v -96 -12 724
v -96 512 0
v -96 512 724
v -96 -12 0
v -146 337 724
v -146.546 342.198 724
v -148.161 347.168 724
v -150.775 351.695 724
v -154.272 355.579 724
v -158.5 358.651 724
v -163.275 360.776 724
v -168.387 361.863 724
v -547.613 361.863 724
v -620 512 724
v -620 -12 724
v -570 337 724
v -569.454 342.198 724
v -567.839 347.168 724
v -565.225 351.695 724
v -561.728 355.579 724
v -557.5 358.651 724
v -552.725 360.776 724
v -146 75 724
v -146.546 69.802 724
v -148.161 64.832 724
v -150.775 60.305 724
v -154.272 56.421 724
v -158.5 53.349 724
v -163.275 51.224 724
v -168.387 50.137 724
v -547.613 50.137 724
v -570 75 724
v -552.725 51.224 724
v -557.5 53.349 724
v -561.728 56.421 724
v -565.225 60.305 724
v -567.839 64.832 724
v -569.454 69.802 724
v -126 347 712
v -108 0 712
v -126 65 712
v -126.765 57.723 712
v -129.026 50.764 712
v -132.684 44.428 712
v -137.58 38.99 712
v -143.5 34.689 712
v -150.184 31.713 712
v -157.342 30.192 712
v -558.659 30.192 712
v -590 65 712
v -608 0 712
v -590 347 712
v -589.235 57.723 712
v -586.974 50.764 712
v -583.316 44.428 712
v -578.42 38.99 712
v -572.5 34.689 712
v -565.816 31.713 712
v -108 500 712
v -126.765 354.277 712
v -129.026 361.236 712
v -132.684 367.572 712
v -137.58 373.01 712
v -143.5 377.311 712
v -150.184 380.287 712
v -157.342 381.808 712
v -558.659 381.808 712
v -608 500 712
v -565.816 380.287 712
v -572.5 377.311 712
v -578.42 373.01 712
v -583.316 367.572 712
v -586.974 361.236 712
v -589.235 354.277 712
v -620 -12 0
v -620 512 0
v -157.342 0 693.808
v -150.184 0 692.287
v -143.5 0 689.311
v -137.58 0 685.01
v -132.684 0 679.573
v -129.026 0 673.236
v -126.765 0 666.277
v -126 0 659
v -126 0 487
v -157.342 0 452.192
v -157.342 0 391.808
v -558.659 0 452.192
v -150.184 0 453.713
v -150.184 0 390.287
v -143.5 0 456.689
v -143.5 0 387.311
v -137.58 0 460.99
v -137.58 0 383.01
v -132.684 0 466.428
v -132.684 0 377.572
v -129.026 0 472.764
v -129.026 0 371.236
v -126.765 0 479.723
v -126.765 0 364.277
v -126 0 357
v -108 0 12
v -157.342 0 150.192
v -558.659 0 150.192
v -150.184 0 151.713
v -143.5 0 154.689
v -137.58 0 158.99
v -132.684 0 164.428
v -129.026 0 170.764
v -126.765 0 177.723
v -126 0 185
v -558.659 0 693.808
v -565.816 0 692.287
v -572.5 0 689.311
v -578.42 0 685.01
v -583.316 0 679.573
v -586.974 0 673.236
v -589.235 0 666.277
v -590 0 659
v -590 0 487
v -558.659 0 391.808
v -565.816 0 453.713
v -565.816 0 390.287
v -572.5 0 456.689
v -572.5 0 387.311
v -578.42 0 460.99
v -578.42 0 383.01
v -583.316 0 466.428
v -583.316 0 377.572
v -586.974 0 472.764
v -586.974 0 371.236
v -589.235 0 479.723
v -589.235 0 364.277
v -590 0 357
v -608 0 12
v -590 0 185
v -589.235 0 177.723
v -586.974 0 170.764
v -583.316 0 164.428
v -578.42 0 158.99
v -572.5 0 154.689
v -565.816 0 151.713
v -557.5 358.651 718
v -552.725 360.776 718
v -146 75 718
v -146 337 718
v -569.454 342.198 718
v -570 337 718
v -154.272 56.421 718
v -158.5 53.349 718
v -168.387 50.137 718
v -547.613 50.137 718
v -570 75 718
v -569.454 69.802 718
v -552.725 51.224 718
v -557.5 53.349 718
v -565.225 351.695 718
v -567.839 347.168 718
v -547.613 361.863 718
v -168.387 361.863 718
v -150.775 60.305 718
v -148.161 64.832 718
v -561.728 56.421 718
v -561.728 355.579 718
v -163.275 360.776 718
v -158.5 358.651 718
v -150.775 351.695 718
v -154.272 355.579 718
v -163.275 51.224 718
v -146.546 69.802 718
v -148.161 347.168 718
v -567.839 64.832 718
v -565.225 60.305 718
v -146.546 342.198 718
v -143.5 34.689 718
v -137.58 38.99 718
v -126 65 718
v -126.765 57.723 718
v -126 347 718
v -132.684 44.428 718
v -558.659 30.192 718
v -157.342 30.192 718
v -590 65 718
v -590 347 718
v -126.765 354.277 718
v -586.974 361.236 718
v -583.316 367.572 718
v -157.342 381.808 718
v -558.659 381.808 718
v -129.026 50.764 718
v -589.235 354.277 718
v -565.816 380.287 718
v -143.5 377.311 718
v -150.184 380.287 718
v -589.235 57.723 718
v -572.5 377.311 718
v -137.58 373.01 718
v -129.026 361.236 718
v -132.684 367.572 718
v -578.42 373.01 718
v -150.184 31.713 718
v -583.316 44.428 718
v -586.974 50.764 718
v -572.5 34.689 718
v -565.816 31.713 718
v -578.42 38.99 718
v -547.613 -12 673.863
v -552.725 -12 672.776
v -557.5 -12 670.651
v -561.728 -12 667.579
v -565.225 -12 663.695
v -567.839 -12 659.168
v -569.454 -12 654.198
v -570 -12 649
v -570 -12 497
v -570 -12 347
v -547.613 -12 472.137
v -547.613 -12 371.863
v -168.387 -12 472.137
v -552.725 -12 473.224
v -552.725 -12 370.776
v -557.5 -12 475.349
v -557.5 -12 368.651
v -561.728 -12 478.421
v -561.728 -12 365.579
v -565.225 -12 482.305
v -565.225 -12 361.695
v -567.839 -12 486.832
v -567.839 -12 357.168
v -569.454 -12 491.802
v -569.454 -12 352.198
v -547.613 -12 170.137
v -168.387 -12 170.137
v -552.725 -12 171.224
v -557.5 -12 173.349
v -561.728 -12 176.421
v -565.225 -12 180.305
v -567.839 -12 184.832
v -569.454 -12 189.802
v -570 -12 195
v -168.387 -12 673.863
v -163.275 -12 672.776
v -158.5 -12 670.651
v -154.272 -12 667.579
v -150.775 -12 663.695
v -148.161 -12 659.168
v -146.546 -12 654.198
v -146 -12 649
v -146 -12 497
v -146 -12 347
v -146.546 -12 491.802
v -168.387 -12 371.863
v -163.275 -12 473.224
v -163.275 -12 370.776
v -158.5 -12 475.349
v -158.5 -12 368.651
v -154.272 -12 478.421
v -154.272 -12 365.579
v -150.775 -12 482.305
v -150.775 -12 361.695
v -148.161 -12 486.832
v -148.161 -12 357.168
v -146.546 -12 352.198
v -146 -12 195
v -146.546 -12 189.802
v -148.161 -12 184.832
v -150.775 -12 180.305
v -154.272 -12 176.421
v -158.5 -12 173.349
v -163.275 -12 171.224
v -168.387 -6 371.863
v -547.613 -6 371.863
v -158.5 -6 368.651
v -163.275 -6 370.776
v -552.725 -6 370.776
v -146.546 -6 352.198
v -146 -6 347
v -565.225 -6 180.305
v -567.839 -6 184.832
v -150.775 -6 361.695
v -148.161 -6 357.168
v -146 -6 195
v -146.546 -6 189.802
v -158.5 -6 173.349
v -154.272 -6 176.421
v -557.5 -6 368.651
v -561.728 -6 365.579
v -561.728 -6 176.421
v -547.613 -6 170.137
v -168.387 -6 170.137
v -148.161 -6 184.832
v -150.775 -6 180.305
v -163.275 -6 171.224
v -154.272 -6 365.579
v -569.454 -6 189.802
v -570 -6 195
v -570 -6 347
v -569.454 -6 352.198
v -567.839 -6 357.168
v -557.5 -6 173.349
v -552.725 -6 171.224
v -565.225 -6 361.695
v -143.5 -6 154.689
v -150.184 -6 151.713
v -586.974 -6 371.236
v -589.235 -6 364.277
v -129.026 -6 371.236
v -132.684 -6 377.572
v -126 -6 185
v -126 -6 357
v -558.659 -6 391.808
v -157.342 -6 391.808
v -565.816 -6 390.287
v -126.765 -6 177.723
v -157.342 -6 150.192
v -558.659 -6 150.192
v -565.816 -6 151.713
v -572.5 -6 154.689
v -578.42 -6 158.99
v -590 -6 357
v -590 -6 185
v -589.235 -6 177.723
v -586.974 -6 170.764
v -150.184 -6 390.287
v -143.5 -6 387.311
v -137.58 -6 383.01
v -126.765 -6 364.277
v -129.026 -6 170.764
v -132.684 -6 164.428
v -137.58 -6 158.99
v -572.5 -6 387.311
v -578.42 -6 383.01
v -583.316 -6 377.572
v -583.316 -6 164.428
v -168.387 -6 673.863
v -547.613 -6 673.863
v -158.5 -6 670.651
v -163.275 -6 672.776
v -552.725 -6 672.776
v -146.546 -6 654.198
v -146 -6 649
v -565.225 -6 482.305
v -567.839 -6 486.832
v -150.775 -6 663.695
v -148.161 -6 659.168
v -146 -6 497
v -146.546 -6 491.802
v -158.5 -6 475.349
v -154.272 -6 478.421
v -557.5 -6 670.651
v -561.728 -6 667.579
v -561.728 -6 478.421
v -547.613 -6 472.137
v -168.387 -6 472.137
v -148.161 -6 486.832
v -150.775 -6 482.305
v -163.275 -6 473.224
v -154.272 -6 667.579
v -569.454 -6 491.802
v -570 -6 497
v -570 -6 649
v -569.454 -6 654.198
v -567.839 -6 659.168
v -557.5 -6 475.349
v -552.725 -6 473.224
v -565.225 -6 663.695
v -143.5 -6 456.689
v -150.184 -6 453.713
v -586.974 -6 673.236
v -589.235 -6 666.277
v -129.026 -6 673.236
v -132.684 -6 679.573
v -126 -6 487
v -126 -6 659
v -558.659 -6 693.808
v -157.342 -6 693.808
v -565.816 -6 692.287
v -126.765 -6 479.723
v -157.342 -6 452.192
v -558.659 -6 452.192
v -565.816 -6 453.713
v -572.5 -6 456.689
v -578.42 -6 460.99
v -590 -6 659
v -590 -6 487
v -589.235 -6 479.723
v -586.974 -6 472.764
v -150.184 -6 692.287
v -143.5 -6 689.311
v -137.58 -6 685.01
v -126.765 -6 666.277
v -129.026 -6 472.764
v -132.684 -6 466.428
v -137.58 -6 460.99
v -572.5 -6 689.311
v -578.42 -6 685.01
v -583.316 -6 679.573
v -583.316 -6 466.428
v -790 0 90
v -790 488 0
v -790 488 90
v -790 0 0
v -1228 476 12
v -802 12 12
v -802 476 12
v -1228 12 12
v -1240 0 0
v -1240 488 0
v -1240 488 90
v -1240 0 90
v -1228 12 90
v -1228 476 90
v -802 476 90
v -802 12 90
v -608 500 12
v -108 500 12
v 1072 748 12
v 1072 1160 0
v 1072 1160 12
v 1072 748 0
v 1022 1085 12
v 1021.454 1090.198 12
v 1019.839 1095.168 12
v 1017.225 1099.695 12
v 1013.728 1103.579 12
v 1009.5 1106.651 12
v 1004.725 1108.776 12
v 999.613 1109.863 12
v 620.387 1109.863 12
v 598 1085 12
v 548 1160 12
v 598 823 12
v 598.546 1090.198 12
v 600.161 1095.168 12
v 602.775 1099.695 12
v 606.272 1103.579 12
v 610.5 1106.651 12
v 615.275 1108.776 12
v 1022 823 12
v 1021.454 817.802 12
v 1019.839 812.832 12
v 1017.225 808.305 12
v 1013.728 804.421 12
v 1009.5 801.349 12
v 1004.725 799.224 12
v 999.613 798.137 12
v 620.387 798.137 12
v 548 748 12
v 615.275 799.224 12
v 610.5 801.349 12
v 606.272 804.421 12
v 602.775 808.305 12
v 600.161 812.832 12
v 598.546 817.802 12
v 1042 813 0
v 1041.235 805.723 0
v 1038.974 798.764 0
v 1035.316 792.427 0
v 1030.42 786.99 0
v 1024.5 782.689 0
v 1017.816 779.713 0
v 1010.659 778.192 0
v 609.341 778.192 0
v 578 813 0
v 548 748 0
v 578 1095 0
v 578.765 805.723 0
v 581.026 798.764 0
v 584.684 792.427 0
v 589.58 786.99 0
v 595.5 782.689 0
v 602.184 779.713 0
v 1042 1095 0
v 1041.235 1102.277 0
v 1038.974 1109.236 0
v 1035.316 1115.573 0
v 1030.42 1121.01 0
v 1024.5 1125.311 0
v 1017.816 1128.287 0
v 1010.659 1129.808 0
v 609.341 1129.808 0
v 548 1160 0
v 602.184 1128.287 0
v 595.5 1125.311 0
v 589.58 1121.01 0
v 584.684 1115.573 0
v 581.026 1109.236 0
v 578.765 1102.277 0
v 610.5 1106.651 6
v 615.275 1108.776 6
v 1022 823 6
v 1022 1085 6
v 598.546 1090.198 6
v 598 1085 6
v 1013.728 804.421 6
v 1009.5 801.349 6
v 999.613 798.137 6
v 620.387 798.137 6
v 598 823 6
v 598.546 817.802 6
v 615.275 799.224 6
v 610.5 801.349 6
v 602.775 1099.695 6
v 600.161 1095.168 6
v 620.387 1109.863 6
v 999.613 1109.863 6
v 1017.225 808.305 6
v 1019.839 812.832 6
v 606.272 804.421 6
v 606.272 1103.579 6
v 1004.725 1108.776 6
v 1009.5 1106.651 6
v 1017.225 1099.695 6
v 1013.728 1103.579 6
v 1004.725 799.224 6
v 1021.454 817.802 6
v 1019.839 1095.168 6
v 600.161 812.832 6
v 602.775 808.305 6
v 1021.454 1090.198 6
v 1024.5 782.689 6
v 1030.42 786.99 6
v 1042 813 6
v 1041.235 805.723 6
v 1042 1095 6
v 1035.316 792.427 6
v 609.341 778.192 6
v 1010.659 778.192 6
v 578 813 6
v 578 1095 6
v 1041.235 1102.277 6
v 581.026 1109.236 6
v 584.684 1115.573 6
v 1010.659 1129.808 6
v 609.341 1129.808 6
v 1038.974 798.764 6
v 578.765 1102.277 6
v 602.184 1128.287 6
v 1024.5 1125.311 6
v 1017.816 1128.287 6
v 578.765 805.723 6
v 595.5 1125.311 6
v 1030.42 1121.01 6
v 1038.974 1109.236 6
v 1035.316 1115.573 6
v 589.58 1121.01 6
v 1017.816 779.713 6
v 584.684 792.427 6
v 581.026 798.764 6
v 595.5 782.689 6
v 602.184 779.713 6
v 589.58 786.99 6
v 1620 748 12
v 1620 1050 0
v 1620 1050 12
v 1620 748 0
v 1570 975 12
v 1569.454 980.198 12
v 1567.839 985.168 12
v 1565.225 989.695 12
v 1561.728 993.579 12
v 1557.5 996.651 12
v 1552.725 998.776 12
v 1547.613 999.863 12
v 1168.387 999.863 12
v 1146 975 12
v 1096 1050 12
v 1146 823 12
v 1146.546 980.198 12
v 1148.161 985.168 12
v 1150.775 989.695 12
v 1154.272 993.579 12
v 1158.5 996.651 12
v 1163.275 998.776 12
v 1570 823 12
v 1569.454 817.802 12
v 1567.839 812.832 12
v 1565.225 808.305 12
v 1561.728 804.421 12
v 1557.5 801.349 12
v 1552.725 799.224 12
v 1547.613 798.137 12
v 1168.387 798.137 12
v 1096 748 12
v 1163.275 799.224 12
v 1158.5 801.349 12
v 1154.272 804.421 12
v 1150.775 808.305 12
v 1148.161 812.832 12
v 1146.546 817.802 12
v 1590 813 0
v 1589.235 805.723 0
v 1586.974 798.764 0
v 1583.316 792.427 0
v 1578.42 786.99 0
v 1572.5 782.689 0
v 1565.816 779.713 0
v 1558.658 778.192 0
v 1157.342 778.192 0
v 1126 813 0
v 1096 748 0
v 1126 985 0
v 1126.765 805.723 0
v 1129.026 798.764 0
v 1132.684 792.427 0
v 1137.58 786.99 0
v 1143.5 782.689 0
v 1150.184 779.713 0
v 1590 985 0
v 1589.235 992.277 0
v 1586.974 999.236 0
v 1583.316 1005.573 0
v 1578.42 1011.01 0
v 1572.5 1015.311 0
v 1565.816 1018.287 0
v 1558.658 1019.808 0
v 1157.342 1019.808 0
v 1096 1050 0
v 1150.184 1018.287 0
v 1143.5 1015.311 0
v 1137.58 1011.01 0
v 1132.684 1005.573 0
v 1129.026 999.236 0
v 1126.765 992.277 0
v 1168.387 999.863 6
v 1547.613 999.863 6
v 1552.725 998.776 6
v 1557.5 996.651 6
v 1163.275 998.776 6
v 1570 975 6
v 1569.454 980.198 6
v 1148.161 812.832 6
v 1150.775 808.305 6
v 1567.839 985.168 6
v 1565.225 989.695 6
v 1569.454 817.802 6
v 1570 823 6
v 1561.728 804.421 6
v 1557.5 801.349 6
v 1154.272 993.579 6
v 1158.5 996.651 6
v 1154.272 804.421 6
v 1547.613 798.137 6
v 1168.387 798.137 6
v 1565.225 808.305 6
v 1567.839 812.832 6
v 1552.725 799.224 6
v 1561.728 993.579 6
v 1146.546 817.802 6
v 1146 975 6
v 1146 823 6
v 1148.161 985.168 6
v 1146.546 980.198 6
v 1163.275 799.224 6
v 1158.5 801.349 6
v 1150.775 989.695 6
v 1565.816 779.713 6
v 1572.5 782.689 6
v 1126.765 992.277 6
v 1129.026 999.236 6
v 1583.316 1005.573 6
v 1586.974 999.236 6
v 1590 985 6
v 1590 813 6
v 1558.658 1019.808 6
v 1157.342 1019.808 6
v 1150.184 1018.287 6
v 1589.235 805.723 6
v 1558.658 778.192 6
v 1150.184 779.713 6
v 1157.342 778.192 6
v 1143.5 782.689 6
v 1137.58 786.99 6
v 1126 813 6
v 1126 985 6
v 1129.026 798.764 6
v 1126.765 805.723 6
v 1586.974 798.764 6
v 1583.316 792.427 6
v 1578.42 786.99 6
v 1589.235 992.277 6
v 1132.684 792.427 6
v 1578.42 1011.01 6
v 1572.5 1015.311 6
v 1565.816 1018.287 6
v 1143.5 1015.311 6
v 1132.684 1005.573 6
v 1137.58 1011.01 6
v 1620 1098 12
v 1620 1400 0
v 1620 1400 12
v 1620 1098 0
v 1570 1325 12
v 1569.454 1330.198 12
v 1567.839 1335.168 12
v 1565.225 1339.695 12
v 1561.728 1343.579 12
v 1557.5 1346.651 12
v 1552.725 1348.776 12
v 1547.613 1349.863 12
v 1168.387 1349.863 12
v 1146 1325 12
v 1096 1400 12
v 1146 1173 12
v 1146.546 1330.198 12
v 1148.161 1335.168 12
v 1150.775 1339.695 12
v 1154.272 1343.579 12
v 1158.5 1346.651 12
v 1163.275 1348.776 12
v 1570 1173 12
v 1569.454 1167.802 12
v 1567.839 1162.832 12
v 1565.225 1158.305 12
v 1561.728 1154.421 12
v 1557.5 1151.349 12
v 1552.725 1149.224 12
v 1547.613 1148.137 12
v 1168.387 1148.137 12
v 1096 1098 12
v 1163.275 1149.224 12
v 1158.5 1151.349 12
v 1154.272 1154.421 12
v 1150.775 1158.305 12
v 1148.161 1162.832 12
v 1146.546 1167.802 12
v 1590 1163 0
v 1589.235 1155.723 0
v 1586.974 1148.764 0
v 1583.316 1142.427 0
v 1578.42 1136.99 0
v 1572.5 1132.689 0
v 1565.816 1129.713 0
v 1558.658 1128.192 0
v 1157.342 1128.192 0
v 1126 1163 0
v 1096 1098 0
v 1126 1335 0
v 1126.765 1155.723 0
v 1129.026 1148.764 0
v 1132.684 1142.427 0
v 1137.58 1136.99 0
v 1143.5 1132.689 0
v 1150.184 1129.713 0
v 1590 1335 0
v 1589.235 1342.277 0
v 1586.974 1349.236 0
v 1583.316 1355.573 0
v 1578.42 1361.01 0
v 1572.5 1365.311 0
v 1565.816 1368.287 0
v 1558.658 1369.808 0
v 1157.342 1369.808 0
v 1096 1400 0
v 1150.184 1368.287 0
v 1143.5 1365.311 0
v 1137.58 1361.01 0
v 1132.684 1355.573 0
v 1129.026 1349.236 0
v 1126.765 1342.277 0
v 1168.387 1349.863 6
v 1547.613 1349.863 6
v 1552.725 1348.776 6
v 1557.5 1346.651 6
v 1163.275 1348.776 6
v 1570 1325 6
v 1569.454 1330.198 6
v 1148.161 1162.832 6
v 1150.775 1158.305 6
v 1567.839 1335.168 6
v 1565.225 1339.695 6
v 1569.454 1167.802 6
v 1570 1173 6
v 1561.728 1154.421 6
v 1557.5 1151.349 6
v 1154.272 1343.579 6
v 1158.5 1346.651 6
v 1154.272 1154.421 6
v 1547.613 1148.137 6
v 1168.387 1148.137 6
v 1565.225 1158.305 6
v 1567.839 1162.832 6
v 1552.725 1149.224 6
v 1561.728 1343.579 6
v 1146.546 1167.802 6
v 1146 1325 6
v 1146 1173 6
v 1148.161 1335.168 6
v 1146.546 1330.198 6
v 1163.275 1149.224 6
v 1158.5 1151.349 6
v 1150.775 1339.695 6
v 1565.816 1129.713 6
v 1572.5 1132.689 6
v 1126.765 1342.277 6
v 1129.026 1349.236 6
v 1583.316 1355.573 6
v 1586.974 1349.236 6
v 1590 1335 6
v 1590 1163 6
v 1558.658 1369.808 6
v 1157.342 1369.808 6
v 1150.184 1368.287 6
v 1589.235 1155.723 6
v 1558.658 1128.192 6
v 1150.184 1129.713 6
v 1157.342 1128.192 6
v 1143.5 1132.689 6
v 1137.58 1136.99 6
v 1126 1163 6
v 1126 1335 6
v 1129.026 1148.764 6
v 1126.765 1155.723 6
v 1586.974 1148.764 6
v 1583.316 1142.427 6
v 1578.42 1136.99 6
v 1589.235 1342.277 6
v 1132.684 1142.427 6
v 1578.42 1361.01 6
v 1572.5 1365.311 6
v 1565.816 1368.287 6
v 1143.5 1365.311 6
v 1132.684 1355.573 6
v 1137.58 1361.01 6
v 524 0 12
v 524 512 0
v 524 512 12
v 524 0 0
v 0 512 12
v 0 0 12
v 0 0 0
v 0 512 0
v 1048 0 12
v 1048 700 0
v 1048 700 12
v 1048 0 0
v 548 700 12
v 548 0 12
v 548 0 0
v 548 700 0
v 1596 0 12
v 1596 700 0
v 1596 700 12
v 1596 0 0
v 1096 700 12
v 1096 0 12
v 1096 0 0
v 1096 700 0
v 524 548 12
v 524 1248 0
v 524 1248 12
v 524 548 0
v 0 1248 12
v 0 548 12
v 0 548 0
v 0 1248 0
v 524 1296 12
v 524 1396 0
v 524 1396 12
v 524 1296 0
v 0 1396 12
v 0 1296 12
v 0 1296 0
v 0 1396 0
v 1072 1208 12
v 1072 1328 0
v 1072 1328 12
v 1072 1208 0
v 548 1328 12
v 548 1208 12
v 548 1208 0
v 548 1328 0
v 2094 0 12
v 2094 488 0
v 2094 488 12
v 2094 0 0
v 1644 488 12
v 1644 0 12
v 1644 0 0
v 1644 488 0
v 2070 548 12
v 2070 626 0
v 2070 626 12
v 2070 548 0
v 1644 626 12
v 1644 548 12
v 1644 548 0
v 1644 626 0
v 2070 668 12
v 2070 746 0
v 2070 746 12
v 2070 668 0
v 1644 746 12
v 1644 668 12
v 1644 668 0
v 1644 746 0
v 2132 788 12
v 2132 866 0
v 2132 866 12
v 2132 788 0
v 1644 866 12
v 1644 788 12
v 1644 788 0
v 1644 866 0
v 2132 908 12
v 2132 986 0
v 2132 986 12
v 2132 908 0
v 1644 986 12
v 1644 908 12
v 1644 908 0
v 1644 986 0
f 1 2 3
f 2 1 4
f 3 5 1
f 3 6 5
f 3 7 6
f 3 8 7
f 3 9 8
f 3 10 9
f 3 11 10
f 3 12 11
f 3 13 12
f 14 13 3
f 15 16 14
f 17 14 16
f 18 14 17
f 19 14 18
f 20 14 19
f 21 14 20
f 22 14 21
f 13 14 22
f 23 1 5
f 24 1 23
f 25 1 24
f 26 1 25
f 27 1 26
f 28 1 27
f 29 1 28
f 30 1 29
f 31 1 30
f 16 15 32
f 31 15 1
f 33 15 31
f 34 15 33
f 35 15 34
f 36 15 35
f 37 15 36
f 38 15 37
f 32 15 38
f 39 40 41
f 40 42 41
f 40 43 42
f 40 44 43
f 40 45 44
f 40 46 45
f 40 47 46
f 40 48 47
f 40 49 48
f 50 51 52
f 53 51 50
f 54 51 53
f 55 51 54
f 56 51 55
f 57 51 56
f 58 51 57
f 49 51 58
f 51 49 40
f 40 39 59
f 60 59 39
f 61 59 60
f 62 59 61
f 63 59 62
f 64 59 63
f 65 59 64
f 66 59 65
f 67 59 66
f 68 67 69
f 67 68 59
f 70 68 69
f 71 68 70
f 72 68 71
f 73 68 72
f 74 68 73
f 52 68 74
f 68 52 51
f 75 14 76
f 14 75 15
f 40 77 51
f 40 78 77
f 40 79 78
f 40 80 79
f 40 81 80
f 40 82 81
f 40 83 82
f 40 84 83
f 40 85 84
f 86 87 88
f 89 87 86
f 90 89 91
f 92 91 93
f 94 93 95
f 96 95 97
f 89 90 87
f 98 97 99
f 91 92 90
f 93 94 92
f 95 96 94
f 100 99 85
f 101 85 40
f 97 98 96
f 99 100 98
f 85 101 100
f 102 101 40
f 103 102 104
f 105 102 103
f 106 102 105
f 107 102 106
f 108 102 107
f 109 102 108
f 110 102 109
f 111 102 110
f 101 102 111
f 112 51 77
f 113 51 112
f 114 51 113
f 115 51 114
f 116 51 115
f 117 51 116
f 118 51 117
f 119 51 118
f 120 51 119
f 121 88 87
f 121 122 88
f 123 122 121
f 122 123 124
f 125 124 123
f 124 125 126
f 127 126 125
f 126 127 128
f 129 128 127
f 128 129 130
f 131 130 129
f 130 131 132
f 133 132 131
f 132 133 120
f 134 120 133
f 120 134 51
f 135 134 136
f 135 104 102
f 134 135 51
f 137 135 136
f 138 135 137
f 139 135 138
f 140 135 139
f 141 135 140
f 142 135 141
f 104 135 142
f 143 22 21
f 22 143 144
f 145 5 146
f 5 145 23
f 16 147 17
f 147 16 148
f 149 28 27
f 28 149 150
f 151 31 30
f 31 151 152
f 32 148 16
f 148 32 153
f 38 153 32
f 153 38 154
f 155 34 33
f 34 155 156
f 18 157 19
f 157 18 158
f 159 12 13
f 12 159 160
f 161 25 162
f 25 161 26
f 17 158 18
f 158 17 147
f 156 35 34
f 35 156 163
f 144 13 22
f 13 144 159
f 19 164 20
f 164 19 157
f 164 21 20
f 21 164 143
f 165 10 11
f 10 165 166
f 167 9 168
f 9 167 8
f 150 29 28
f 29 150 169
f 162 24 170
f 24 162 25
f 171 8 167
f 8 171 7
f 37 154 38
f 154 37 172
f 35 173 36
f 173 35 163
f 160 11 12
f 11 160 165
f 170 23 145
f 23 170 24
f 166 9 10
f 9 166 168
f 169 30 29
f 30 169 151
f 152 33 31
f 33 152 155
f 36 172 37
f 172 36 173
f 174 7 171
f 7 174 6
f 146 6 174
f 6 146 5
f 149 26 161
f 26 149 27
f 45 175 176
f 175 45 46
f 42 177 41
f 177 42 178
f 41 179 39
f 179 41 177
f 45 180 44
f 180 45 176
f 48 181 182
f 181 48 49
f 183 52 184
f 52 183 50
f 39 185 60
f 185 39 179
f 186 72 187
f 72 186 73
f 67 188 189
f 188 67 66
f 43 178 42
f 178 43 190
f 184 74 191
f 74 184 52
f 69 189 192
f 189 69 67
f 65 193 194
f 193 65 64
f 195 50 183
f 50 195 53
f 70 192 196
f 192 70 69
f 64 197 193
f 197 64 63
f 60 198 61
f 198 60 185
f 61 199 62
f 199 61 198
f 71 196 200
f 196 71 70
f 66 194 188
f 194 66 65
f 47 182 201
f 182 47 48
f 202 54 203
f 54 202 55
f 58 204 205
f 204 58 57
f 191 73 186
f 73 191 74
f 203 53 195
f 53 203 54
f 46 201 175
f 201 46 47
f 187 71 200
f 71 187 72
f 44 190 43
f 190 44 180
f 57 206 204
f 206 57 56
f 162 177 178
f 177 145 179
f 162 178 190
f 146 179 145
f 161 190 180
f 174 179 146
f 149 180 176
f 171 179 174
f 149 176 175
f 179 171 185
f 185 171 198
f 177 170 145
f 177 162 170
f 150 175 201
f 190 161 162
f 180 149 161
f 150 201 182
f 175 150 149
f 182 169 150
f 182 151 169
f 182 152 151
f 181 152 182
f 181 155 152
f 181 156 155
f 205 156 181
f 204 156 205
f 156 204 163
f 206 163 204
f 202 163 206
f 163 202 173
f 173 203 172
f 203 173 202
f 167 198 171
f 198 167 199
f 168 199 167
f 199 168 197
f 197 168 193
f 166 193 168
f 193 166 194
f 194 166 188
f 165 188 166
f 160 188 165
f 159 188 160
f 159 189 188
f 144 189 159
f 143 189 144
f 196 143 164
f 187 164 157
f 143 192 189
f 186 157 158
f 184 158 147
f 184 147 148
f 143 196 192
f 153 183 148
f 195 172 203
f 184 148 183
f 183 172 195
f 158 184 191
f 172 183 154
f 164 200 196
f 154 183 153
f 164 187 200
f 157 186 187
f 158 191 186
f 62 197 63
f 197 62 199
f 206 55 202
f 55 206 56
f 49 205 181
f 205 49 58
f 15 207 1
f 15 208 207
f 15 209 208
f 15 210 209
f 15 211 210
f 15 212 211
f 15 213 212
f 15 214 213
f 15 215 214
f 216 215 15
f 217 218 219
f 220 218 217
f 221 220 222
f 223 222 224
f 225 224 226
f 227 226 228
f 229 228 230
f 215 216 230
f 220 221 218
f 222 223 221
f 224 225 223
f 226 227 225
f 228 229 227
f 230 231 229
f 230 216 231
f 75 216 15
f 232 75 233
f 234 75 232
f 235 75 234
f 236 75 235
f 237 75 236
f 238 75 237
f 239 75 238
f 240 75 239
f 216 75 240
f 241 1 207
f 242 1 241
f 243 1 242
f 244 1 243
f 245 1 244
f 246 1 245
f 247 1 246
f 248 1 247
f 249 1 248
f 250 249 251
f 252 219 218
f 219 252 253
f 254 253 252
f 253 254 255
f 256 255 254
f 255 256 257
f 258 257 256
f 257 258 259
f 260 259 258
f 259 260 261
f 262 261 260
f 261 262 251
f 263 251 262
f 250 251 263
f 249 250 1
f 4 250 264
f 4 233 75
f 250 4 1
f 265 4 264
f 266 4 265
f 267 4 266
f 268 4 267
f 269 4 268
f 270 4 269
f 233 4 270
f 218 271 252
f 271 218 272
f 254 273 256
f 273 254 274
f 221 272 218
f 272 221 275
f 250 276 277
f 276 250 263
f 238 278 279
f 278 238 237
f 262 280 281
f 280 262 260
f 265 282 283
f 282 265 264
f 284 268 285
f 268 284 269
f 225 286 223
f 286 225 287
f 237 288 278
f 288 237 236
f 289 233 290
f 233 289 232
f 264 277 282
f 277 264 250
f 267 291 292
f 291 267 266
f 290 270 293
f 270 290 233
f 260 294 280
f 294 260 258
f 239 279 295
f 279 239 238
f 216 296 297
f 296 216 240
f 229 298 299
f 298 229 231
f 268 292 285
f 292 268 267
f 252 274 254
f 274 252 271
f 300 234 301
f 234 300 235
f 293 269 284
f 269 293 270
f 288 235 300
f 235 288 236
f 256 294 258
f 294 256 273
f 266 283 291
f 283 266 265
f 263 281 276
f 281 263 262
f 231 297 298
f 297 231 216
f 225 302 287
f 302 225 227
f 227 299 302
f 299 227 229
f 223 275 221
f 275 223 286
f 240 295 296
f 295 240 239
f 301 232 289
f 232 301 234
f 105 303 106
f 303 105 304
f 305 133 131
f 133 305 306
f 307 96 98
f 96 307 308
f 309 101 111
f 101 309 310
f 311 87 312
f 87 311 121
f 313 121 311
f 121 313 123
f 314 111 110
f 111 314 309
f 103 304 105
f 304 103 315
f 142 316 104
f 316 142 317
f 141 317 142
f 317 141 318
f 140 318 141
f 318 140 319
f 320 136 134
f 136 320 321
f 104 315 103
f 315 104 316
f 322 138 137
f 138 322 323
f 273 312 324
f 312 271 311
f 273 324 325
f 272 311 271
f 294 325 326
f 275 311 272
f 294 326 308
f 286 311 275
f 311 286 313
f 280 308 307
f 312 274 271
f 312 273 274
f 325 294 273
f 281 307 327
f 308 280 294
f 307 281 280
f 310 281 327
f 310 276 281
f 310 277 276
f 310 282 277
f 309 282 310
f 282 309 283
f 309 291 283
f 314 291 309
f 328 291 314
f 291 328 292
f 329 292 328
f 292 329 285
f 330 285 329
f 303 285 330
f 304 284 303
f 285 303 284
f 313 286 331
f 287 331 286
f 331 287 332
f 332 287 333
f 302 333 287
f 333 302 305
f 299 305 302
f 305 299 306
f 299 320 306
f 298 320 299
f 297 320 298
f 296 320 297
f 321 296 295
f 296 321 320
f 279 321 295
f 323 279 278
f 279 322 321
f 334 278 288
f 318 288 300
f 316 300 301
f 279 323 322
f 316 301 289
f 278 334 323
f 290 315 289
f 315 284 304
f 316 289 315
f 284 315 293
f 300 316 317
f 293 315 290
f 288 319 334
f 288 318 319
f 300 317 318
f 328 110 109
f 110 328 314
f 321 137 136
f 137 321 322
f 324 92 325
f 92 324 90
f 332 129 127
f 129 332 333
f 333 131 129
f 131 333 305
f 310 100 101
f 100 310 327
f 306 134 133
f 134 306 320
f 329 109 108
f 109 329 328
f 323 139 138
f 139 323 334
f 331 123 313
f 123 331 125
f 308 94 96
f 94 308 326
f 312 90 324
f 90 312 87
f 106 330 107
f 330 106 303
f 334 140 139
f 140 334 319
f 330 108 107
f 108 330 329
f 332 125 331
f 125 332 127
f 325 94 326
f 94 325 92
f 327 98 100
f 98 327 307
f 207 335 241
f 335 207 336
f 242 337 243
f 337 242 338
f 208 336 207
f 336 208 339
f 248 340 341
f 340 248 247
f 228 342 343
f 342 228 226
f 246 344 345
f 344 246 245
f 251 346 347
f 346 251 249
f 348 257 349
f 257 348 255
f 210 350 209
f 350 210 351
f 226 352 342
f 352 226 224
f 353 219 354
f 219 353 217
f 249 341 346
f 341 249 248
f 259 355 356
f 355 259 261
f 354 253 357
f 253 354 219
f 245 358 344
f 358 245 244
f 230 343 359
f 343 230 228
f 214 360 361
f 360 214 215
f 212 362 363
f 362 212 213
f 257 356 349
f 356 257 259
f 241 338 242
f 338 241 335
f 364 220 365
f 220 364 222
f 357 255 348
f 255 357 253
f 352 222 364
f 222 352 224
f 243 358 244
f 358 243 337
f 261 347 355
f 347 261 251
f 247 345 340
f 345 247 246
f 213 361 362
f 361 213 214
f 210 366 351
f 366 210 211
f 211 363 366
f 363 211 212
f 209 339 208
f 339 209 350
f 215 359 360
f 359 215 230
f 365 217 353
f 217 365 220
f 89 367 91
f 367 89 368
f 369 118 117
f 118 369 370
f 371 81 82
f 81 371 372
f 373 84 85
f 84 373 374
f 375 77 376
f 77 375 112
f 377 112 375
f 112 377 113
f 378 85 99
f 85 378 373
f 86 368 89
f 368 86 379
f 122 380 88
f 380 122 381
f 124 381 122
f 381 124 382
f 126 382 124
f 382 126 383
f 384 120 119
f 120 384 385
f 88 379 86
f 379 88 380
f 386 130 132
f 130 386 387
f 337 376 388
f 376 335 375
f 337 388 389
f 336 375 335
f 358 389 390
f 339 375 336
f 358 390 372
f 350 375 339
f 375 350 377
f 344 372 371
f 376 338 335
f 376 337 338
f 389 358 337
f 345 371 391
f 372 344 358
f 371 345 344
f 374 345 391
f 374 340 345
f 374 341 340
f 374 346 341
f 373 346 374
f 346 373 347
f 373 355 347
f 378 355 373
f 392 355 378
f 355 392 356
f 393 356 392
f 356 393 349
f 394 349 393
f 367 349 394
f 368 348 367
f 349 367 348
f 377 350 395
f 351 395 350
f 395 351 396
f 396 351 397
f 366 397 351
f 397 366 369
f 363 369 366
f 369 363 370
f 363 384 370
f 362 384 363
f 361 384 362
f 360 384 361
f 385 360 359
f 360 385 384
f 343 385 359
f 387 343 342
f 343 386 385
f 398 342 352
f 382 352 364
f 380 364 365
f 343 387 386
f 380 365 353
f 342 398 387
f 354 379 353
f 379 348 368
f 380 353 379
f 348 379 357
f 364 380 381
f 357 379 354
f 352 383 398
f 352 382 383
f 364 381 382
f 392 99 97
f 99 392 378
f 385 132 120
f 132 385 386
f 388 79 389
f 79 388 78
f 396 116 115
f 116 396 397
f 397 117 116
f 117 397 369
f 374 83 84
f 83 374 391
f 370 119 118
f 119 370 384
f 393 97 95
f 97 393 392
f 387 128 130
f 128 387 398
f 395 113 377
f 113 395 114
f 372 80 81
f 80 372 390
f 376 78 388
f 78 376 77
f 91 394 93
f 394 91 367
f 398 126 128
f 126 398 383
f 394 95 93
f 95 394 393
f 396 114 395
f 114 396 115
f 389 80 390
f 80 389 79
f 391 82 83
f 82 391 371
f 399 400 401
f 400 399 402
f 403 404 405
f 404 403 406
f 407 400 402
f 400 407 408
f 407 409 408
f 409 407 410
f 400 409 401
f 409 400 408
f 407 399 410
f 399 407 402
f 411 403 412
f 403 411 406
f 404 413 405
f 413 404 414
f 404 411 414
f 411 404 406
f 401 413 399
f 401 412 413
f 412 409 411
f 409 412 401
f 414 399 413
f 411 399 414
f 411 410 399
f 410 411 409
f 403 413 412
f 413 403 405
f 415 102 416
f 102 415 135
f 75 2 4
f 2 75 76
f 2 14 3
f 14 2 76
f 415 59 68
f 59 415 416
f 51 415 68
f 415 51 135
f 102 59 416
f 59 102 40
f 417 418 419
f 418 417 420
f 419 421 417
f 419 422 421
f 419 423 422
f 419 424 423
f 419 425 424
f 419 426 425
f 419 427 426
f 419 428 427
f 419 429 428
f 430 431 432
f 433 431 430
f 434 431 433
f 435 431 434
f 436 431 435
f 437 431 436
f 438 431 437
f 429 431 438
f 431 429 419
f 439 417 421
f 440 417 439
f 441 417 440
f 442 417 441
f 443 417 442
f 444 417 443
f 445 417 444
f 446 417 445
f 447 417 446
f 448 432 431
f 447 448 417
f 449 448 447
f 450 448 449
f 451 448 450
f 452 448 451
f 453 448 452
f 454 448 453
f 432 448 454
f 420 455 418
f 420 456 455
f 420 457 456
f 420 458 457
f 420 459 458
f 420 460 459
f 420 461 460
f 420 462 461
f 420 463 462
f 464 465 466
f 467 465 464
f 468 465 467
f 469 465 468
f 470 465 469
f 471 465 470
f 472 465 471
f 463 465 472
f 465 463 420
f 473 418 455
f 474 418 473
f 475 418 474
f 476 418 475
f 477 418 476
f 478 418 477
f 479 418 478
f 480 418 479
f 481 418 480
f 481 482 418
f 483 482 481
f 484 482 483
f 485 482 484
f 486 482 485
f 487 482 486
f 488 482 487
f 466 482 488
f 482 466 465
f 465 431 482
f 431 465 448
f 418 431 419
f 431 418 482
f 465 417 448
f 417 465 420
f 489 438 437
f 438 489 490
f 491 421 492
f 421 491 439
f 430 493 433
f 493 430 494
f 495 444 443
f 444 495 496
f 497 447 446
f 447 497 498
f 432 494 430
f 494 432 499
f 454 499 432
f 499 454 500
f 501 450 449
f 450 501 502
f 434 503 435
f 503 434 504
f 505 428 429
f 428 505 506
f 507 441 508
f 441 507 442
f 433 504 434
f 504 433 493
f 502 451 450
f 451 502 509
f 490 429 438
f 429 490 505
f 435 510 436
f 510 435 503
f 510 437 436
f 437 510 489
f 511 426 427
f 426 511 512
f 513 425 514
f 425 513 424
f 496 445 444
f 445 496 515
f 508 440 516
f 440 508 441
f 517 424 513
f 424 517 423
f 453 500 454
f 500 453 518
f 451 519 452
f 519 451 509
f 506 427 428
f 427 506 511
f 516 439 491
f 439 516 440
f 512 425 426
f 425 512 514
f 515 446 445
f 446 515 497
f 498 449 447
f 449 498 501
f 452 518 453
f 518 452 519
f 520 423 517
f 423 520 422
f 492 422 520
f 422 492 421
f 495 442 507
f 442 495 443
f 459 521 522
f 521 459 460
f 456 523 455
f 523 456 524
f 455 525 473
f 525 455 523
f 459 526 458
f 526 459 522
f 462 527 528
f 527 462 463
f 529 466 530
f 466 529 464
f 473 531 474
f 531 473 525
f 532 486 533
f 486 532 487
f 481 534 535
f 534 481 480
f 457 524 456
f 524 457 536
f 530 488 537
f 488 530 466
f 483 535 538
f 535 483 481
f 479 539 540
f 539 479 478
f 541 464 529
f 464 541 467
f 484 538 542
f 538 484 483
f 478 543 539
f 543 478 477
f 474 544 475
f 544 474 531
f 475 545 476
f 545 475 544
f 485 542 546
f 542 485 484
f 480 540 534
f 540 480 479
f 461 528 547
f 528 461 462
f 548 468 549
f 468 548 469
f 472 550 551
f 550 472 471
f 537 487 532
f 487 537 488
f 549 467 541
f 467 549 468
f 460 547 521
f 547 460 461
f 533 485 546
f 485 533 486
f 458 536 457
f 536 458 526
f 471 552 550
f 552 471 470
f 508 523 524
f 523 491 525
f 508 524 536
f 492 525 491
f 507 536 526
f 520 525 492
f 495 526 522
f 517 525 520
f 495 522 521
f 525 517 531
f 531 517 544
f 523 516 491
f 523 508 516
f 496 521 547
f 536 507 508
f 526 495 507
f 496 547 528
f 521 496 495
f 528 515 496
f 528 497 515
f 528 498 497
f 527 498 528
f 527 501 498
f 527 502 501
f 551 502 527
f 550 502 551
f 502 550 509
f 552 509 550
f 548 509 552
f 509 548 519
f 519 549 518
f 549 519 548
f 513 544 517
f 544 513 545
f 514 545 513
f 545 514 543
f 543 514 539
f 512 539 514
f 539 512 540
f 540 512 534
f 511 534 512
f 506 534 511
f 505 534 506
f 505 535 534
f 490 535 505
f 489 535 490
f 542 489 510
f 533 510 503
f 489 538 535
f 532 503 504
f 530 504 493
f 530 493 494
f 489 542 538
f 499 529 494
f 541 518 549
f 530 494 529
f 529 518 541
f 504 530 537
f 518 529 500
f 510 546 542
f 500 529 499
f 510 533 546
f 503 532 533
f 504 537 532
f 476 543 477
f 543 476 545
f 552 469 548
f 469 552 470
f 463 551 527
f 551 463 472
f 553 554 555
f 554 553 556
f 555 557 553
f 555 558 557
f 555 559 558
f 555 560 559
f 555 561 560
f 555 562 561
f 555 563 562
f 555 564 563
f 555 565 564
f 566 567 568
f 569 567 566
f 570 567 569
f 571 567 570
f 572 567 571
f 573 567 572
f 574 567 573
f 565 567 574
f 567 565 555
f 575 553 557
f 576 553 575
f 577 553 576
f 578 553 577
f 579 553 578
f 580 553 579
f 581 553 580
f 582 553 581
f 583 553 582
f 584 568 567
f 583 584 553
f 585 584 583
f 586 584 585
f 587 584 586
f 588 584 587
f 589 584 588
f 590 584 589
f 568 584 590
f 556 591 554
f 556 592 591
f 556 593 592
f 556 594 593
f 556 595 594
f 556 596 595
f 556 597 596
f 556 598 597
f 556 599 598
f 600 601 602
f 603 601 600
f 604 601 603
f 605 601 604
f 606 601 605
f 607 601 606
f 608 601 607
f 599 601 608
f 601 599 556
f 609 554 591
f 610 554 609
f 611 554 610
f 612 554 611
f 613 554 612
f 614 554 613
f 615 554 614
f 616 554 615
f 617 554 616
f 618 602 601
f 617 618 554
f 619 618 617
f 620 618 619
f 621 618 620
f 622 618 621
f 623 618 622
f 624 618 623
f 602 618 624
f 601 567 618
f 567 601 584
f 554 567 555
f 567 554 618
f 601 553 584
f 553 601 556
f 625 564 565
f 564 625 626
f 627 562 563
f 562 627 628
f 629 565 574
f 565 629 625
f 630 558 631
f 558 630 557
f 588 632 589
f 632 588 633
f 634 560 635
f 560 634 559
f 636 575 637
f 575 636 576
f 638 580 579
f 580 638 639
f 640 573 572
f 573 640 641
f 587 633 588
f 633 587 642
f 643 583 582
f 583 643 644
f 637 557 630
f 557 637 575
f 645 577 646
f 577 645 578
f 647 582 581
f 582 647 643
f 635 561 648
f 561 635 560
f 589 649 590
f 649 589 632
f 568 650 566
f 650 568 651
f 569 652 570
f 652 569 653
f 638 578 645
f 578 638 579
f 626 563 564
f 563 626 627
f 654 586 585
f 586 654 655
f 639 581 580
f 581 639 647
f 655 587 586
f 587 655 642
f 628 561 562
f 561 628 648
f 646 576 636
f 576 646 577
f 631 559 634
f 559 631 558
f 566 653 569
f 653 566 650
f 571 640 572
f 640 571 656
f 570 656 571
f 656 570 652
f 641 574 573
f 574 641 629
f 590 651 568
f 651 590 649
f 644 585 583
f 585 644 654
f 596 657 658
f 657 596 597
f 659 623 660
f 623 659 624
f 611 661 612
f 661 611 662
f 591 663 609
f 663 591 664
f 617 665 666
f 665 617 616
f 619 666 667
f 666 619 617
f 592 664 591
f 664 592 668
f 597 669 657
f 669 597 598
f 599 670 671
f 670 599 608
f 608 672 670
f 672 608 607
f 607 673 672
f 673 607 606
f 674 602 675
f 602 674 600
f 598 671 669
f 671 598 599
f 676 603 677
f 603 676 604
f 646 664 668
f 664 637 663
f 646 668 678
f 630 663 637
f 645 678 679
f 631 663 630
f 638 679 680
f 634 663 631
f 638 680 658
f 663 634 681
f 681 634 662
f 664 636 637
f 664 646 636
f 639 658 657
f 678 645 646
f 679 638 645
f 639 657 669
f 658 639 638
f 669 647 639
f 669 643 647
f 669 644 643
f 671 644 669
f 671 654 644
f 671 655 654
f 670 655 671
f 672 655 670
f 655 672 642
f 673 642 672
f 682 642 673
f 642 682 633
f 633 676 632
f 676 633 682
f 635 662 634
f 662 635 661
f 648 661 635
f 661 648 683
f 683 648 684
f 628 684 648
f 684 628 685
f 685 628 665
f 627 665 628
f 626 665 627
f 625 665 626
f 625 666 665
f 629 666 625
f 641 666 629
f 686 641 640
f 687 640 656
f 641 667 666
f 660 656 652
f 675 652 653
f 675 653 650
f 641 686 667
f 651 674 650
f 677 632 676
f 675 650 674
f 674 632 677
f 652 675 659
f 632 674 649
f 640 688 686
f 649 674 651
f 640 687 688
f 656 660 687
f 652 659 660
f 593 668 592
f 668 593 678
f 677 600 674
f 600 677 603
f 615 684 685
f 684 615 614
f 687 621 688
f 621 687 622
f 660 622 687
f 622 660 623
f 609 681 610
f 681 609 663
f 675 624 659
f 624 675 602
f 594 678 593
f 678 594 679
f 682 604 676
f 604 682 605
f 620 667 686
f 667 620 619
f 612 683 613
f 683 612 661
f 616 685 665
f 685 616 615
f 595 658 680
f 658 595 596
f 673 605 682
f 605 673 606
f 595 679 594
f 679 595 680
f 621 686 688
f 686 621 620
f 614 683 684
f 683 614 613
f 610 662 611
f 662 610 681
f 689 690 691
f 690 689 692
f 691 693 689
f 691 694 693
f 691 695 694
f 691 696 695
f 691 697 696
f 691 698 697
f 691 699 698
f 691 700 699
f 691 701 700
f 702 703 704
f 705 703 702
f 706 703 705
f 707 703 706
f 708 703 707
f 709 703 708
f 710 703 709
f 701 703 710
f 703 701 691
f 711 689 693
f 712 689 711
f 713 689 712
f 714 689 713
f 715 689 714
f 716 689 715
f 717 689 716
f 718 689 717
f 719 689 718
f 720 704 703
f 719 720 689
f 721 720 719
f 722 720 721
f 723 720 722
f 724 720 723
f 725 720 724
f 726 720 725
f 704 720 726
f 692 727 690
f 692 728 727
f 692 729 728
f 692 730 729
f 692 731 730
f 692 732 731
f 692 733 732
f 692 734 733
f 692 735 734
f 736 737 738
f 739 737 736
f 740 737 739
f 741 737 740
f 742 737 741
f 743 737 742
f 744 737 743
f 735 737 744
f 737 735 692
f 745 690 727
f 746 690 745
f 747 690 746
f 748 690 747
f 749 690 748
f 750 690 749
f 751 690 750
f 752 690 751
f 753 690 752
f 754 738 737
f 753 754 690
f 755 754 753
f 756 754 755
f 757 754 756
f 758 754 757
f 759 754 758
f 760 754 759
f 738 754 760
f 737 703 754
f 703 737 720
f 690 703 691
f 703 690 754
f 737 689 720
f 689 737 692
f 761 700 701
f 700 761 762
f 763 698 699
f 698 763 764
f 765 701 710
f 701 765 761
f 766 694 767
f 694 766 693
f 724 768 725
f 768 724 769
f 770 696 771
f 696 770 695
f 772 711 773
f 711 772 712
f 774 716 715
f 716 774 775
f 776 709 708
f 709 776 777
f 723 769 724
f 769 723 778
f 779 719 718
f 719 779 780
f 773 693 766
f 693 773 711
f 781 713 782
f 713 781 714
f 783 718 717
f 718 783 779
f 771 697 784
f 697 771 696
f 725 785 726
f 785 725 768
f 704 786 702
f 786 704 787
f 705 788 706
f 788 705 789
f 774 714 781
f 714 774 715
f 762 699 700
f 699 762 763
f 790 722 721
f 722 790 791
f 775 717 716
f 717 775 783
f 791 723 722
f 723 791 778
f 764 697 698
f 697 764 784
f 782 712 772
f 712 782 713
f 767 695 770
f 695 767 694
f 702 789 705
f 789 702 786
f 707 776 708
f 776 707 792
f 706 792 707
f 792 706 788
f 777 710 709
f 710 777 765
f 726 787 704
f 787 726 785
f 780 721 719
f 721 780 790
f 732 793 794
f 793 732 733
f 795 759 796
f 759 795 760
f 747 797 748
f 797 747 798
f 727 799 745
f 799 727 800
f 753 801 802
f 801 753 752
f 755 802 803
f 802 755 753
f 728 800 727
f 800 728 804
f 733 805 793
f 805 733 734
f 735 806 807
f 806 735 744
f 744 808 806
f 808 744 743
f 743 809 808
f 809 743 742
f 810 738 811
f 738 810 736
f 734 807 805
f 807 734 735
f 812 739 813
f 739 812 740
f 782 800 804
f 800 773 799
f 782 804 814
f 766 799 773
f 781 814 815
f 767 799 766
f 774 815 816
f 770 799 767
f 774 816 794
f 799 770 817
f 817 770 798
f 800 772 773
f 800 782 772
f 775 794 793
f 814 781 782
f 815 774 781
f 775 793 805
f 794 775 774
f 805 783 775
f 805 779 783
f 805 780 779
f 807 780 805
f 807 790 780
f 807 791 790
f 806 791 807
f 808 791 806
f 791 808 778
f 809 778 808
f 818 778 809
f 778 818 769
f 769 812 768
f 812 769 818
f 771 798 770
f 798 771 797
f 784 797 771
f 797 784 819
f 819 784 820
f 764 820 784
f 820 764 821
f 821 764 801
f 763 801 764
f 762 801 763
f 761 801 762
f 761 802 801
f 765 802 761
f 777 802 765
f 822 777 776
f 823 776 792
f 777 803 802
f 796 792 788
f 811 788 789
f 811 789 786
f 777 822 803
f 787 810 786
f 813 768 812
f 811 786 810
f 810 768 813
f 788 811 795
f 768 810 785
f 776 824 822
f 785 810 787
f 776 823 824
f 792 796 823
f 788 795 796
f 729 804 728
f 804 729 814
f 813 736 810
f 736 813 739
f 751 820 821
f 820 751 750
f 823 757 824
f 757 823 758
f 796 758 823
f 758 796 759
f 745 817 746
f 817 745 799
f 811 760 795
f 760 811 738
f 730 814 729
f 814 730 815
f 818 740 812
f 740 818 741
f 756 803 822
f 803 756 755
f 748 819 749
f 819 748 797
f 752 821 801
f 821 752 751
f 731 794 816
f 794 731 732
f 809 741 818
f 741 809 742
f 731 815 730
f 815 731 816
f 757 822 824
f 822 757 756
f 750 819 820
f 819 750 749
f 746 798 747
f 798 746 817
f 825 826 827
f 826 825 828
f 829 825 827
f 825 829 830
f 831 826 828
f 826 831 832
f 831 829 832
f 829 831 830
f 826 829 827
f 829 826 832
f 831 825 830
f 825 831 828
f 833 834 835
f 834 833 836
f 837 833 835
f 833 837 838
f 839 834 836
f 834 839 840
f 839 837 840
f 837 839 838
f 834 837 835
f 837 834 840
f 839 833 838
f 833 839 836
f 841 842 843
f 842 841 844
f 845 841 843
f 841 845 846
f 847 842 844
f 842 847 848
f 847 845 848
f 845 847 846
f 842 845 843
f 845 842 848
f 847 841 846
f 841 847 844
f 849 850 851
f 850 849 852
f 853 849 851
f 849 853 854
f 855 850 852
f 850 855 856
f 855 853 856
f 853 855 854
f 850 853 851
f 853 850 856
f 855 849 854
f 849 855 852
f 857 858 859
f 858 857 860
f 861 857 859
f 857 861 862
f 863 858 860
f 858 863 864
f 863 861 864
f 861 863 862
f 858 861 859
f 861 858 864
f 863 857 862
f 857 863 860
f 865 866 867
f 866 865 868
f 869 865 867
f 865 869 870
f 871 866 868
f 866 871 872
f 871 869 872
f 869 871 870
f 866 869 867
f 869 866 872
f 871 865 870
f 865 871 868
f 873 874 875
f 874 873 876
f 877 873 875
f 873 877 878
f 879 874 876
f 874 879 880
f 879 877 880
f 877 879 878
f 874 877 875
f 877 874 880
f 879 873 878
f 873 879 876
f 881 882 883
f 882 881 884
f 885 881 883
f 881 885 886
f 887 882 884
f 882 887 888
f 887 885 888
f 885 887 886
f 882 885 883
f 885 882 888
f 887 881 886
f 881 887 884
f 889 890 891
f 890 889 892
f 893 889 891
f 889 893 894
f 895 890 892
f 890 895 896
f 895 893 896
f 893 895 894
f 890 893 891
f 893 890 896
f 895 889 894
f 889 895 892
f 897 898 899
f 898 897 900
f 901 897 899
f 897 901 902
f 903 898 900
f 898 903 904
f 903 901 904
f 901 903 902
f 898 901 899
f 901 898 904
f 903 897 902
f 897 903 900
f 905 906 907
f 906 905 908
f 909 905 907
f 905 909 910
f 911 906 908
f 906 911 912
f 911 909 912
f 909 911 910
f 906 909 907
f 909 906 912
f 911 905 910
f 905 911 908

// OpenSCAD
// Alter these first four values to change the size and
// thickness of your cabinet.
//
// Note: Dimensions are INTERNAL, that is, your cabinet will
// be this big INSIDE.   It will be bigger by twice the thickness
// on the outside.   Sorry, no Time Lord technology in use here.
//
// Default size fits a Wanhao Duplicator i3 plus
// For a Tronxy X3A: 600,600,600
// For a Tranxy X5-400: 800, 700, 700, thickness=18

width = 500;
depth = 500;
height = 700;
thickness = 12;

// Only change the below if you want to change the proportions
// of the windows and drawer
//
top = depth / 5;
border = 50;
borderradius = border/2;
windowrebate=10;

drawer_thickness = 12;
drawer_height = 120;

// You should only need to change the drawer border if
// you are not using standard ballbearing drawer slides

drawer_side_border = 25;
drawer_bottom_border = 20;
drawer_top_border = 10;

// You should not need to change anything beyond here

topwindow_width = width+2*thickness;
topwindow_depth = depth+thickness-top;

frontwindow_width = width+2*thickness;
frontwindow_depth = (height+2*thickness-drawer_height)/2;

fuzz = 0.4;

module piece(w, d, name) {
    echo(str("  Cut one ", name, " piece ", w, " wide by ", d, " deep."));
    cube([w,d,thickness]);
    translate([w/2, d/2, thickness+fuzz]) color("blue") { //linear_extrude(height=50) { 
        text(text=name, 
            halign="center", valign="center",
            size=50,
            font="Avenir Next Condensed:style=Demi Bold"
        ); 
    }
}

module base() {
    piece(width+2*thickness, depth+thickness, "base");
}
//base();

module back() {
    piece(width+2*thickness, height, "back");
}
//back();

module side() {
    piece(depth, height, "side");
}
//side();

module top() {
    piece(width+2*thickness, top, "top rail");
}
//top();

module window(w, d, name) {
    c = border + borderradius; // center offset
    rr = borderradius+windowrebate; //rebate radius
    rc = border + borderradius - windowrebate; // rebate center offset

    difference() {
        piece(w, d, str(name, " window"));
        echo(str("   Drill four ", 2*borderradius, " dia holes centered ", c, " in from the edges."));
        echo(str("   Join the four holes with a jigsaw, then use a router to cut a ", windowrebate, " mm rebate (or rabbet if are Amerikanski)."));
        hull() {
            translate([c, c,-fuzz]) cylinder(r=borderradius, h=thickness+2*fuzz);
            translate([w-c,c,-fuzz]) cylinder(r=borderradius, h=thickness+2*fuzz);
            translate([c,d-c,-fuzz]) cylinder(r=borderradius, h=thickness+2*fuzz);
            translate([w-c,d-c,-fuzz]) cylinder(r=borderradius, h=thickness+2*fuzz);
        }
        hull() {
            translate([rc, rc,-fuzz]) cylinder(r=rr, h=thickness/2+fuzz);
            translate([w-rc,rc,-fuzz]) cylinder(r=rr, h=thickness/2+fuzz);
            translate([rc,d-rc,-fuzz]) cylinder(r=rr, h=thickness/2+fuzz);
            translate([w-rc,d-rc,-fuzz]) cylinder(r=rr, h=thickness/2+fuzz);
        }
    }
}

module topwindow() {
    window(topwindow_width, topwindow_depth, "top");
}
//topwindow();

module frontwindow() {
    window(frontwindow_width, frontwindow_depth, "front");
}

module drawerfalsefront() {
    piece(width+2*thickness, drawer_height, "drawer false front");
}

module drawerbase() {
    piece(width-2*drawer_side_border, depth-drawer_thickness, "drawer base");
}

module drawerside() {
    piece(depth-drawer_thickness, drawer_height-drawer_top_border-drawer_thickness-drawer_bottom_border, "drawer side");
}

module drawerfrontback(name) {
    piece(width-2*drawer_side_border-2*drawer_thickness, drawer_height-drawer_top_border-drawer_thickness-drawer_bottom_border, str("drawer ",name));
}

module drawer_assembled() {
    drawerbase();
    translate([drawer_thickness, drawer_thickness, drawer_thickness]) rotate([90,0,0]) color("orange") drawerfrontback("front");
    translate([drawer_thickness, depth-drawer_thickness, drawer_thickness]) rotate([90,0,0]) color("black") drawerfrontback("back");
    translate([0, 0, drawer_thickness]) rotate([90,0,90]) color("yellow") drawerside();
    translate([width-2*drawer_side_border-drawer_thickness, 0, drawer_thickness]) rotate([90,0,90]) color("red") drawerside();
}


module assembled() {
    base();
    translate([0,depth+thickness, thickness]) rotate([90,0,0]) color("black") back();
    translate([0,0,thickness]) rotate([90,0,90]) color("yellow") side();
    translate([width+thickness,0,thickness]) rotate([90,0,90]) color("red") side();
    translate([0, depth+thickness-top, height+thickness]) color("blue") top();
    translate([0, 0, height+thickness]) color("cyan") topwindow();
    translate([0, 0, 0]) rotate([90,0,0]) color("orange") drawerfalsefront();
    translate([0, 0, drawer_height]) rotate([90,0,0]) color("magenta") frontwindow();
    translate([0, 0, drawer_height+frontwindow_depth]) rotate([90,0,0]) color("green") frontwindow();

    translate([-width-drawer_height, 0, 0]) drawer_assembled();
}
//assembled();

module parts() {
    g = 4*thickness; // gap
    base();
    translate([width+g,0,0]) side();
    translate([width+g+depth+g,0,0]) side();
    translate([0, depth+g, 0]) back();
    translate([0, depth+g+height+g, 0]) top();
    translate([width+g,height+g,0]) topwindow();
    translate([width+g,height+g+topwindow_depth+g,0]) drawerfalsefront();
    translate([width+g+depth+g,0,0]) side();
    translate([width+g+depth+g, height+g]) {
        frontwindow();
        translate([0,frontwindow_depth+g,0]) frontwindow();
    }

    do = width+g+depth+g+width+g; // drawer offset
    translate([do,0,0]) drawerbase();
    translate([do,depth+g,0]) drawerfrontback("front");
    translate([do,depth+g+drawer_height,0]) drawerfrontback("back");
    translate([do,depth+g+2*drawer_height,0]) drawerside("");
    translate([do,depth+g+3*drawer_height,0]) drawerside("");

//    translate([drawer_thickness, depth-drawer_thickness, drawer_thickness]) rotate([90,0,0]) color("black") drawerfrontback("back");
//    translate([0, 0, drawer_thickness]) rotate([90,0,90]) color("yellow") drawerside();
//    translate([width-2*drawer_side_border-drawer_thickness, 0, drawer_thickness]) rotate([90,0,90]) color("red") drawerside();

}

echo("");
echo("PARTS LIST STARTS HERE");
echo(str("To make cabinet with internal dimensions ", width, " wide by ", depth, " deep by ", height, " tall:"));
translate([-width-drawer_height,0,0]) assembled();
echo("PARTS LIST ENDS HERE");
echo("");
echo("(ignore further instructions)");

parts();
